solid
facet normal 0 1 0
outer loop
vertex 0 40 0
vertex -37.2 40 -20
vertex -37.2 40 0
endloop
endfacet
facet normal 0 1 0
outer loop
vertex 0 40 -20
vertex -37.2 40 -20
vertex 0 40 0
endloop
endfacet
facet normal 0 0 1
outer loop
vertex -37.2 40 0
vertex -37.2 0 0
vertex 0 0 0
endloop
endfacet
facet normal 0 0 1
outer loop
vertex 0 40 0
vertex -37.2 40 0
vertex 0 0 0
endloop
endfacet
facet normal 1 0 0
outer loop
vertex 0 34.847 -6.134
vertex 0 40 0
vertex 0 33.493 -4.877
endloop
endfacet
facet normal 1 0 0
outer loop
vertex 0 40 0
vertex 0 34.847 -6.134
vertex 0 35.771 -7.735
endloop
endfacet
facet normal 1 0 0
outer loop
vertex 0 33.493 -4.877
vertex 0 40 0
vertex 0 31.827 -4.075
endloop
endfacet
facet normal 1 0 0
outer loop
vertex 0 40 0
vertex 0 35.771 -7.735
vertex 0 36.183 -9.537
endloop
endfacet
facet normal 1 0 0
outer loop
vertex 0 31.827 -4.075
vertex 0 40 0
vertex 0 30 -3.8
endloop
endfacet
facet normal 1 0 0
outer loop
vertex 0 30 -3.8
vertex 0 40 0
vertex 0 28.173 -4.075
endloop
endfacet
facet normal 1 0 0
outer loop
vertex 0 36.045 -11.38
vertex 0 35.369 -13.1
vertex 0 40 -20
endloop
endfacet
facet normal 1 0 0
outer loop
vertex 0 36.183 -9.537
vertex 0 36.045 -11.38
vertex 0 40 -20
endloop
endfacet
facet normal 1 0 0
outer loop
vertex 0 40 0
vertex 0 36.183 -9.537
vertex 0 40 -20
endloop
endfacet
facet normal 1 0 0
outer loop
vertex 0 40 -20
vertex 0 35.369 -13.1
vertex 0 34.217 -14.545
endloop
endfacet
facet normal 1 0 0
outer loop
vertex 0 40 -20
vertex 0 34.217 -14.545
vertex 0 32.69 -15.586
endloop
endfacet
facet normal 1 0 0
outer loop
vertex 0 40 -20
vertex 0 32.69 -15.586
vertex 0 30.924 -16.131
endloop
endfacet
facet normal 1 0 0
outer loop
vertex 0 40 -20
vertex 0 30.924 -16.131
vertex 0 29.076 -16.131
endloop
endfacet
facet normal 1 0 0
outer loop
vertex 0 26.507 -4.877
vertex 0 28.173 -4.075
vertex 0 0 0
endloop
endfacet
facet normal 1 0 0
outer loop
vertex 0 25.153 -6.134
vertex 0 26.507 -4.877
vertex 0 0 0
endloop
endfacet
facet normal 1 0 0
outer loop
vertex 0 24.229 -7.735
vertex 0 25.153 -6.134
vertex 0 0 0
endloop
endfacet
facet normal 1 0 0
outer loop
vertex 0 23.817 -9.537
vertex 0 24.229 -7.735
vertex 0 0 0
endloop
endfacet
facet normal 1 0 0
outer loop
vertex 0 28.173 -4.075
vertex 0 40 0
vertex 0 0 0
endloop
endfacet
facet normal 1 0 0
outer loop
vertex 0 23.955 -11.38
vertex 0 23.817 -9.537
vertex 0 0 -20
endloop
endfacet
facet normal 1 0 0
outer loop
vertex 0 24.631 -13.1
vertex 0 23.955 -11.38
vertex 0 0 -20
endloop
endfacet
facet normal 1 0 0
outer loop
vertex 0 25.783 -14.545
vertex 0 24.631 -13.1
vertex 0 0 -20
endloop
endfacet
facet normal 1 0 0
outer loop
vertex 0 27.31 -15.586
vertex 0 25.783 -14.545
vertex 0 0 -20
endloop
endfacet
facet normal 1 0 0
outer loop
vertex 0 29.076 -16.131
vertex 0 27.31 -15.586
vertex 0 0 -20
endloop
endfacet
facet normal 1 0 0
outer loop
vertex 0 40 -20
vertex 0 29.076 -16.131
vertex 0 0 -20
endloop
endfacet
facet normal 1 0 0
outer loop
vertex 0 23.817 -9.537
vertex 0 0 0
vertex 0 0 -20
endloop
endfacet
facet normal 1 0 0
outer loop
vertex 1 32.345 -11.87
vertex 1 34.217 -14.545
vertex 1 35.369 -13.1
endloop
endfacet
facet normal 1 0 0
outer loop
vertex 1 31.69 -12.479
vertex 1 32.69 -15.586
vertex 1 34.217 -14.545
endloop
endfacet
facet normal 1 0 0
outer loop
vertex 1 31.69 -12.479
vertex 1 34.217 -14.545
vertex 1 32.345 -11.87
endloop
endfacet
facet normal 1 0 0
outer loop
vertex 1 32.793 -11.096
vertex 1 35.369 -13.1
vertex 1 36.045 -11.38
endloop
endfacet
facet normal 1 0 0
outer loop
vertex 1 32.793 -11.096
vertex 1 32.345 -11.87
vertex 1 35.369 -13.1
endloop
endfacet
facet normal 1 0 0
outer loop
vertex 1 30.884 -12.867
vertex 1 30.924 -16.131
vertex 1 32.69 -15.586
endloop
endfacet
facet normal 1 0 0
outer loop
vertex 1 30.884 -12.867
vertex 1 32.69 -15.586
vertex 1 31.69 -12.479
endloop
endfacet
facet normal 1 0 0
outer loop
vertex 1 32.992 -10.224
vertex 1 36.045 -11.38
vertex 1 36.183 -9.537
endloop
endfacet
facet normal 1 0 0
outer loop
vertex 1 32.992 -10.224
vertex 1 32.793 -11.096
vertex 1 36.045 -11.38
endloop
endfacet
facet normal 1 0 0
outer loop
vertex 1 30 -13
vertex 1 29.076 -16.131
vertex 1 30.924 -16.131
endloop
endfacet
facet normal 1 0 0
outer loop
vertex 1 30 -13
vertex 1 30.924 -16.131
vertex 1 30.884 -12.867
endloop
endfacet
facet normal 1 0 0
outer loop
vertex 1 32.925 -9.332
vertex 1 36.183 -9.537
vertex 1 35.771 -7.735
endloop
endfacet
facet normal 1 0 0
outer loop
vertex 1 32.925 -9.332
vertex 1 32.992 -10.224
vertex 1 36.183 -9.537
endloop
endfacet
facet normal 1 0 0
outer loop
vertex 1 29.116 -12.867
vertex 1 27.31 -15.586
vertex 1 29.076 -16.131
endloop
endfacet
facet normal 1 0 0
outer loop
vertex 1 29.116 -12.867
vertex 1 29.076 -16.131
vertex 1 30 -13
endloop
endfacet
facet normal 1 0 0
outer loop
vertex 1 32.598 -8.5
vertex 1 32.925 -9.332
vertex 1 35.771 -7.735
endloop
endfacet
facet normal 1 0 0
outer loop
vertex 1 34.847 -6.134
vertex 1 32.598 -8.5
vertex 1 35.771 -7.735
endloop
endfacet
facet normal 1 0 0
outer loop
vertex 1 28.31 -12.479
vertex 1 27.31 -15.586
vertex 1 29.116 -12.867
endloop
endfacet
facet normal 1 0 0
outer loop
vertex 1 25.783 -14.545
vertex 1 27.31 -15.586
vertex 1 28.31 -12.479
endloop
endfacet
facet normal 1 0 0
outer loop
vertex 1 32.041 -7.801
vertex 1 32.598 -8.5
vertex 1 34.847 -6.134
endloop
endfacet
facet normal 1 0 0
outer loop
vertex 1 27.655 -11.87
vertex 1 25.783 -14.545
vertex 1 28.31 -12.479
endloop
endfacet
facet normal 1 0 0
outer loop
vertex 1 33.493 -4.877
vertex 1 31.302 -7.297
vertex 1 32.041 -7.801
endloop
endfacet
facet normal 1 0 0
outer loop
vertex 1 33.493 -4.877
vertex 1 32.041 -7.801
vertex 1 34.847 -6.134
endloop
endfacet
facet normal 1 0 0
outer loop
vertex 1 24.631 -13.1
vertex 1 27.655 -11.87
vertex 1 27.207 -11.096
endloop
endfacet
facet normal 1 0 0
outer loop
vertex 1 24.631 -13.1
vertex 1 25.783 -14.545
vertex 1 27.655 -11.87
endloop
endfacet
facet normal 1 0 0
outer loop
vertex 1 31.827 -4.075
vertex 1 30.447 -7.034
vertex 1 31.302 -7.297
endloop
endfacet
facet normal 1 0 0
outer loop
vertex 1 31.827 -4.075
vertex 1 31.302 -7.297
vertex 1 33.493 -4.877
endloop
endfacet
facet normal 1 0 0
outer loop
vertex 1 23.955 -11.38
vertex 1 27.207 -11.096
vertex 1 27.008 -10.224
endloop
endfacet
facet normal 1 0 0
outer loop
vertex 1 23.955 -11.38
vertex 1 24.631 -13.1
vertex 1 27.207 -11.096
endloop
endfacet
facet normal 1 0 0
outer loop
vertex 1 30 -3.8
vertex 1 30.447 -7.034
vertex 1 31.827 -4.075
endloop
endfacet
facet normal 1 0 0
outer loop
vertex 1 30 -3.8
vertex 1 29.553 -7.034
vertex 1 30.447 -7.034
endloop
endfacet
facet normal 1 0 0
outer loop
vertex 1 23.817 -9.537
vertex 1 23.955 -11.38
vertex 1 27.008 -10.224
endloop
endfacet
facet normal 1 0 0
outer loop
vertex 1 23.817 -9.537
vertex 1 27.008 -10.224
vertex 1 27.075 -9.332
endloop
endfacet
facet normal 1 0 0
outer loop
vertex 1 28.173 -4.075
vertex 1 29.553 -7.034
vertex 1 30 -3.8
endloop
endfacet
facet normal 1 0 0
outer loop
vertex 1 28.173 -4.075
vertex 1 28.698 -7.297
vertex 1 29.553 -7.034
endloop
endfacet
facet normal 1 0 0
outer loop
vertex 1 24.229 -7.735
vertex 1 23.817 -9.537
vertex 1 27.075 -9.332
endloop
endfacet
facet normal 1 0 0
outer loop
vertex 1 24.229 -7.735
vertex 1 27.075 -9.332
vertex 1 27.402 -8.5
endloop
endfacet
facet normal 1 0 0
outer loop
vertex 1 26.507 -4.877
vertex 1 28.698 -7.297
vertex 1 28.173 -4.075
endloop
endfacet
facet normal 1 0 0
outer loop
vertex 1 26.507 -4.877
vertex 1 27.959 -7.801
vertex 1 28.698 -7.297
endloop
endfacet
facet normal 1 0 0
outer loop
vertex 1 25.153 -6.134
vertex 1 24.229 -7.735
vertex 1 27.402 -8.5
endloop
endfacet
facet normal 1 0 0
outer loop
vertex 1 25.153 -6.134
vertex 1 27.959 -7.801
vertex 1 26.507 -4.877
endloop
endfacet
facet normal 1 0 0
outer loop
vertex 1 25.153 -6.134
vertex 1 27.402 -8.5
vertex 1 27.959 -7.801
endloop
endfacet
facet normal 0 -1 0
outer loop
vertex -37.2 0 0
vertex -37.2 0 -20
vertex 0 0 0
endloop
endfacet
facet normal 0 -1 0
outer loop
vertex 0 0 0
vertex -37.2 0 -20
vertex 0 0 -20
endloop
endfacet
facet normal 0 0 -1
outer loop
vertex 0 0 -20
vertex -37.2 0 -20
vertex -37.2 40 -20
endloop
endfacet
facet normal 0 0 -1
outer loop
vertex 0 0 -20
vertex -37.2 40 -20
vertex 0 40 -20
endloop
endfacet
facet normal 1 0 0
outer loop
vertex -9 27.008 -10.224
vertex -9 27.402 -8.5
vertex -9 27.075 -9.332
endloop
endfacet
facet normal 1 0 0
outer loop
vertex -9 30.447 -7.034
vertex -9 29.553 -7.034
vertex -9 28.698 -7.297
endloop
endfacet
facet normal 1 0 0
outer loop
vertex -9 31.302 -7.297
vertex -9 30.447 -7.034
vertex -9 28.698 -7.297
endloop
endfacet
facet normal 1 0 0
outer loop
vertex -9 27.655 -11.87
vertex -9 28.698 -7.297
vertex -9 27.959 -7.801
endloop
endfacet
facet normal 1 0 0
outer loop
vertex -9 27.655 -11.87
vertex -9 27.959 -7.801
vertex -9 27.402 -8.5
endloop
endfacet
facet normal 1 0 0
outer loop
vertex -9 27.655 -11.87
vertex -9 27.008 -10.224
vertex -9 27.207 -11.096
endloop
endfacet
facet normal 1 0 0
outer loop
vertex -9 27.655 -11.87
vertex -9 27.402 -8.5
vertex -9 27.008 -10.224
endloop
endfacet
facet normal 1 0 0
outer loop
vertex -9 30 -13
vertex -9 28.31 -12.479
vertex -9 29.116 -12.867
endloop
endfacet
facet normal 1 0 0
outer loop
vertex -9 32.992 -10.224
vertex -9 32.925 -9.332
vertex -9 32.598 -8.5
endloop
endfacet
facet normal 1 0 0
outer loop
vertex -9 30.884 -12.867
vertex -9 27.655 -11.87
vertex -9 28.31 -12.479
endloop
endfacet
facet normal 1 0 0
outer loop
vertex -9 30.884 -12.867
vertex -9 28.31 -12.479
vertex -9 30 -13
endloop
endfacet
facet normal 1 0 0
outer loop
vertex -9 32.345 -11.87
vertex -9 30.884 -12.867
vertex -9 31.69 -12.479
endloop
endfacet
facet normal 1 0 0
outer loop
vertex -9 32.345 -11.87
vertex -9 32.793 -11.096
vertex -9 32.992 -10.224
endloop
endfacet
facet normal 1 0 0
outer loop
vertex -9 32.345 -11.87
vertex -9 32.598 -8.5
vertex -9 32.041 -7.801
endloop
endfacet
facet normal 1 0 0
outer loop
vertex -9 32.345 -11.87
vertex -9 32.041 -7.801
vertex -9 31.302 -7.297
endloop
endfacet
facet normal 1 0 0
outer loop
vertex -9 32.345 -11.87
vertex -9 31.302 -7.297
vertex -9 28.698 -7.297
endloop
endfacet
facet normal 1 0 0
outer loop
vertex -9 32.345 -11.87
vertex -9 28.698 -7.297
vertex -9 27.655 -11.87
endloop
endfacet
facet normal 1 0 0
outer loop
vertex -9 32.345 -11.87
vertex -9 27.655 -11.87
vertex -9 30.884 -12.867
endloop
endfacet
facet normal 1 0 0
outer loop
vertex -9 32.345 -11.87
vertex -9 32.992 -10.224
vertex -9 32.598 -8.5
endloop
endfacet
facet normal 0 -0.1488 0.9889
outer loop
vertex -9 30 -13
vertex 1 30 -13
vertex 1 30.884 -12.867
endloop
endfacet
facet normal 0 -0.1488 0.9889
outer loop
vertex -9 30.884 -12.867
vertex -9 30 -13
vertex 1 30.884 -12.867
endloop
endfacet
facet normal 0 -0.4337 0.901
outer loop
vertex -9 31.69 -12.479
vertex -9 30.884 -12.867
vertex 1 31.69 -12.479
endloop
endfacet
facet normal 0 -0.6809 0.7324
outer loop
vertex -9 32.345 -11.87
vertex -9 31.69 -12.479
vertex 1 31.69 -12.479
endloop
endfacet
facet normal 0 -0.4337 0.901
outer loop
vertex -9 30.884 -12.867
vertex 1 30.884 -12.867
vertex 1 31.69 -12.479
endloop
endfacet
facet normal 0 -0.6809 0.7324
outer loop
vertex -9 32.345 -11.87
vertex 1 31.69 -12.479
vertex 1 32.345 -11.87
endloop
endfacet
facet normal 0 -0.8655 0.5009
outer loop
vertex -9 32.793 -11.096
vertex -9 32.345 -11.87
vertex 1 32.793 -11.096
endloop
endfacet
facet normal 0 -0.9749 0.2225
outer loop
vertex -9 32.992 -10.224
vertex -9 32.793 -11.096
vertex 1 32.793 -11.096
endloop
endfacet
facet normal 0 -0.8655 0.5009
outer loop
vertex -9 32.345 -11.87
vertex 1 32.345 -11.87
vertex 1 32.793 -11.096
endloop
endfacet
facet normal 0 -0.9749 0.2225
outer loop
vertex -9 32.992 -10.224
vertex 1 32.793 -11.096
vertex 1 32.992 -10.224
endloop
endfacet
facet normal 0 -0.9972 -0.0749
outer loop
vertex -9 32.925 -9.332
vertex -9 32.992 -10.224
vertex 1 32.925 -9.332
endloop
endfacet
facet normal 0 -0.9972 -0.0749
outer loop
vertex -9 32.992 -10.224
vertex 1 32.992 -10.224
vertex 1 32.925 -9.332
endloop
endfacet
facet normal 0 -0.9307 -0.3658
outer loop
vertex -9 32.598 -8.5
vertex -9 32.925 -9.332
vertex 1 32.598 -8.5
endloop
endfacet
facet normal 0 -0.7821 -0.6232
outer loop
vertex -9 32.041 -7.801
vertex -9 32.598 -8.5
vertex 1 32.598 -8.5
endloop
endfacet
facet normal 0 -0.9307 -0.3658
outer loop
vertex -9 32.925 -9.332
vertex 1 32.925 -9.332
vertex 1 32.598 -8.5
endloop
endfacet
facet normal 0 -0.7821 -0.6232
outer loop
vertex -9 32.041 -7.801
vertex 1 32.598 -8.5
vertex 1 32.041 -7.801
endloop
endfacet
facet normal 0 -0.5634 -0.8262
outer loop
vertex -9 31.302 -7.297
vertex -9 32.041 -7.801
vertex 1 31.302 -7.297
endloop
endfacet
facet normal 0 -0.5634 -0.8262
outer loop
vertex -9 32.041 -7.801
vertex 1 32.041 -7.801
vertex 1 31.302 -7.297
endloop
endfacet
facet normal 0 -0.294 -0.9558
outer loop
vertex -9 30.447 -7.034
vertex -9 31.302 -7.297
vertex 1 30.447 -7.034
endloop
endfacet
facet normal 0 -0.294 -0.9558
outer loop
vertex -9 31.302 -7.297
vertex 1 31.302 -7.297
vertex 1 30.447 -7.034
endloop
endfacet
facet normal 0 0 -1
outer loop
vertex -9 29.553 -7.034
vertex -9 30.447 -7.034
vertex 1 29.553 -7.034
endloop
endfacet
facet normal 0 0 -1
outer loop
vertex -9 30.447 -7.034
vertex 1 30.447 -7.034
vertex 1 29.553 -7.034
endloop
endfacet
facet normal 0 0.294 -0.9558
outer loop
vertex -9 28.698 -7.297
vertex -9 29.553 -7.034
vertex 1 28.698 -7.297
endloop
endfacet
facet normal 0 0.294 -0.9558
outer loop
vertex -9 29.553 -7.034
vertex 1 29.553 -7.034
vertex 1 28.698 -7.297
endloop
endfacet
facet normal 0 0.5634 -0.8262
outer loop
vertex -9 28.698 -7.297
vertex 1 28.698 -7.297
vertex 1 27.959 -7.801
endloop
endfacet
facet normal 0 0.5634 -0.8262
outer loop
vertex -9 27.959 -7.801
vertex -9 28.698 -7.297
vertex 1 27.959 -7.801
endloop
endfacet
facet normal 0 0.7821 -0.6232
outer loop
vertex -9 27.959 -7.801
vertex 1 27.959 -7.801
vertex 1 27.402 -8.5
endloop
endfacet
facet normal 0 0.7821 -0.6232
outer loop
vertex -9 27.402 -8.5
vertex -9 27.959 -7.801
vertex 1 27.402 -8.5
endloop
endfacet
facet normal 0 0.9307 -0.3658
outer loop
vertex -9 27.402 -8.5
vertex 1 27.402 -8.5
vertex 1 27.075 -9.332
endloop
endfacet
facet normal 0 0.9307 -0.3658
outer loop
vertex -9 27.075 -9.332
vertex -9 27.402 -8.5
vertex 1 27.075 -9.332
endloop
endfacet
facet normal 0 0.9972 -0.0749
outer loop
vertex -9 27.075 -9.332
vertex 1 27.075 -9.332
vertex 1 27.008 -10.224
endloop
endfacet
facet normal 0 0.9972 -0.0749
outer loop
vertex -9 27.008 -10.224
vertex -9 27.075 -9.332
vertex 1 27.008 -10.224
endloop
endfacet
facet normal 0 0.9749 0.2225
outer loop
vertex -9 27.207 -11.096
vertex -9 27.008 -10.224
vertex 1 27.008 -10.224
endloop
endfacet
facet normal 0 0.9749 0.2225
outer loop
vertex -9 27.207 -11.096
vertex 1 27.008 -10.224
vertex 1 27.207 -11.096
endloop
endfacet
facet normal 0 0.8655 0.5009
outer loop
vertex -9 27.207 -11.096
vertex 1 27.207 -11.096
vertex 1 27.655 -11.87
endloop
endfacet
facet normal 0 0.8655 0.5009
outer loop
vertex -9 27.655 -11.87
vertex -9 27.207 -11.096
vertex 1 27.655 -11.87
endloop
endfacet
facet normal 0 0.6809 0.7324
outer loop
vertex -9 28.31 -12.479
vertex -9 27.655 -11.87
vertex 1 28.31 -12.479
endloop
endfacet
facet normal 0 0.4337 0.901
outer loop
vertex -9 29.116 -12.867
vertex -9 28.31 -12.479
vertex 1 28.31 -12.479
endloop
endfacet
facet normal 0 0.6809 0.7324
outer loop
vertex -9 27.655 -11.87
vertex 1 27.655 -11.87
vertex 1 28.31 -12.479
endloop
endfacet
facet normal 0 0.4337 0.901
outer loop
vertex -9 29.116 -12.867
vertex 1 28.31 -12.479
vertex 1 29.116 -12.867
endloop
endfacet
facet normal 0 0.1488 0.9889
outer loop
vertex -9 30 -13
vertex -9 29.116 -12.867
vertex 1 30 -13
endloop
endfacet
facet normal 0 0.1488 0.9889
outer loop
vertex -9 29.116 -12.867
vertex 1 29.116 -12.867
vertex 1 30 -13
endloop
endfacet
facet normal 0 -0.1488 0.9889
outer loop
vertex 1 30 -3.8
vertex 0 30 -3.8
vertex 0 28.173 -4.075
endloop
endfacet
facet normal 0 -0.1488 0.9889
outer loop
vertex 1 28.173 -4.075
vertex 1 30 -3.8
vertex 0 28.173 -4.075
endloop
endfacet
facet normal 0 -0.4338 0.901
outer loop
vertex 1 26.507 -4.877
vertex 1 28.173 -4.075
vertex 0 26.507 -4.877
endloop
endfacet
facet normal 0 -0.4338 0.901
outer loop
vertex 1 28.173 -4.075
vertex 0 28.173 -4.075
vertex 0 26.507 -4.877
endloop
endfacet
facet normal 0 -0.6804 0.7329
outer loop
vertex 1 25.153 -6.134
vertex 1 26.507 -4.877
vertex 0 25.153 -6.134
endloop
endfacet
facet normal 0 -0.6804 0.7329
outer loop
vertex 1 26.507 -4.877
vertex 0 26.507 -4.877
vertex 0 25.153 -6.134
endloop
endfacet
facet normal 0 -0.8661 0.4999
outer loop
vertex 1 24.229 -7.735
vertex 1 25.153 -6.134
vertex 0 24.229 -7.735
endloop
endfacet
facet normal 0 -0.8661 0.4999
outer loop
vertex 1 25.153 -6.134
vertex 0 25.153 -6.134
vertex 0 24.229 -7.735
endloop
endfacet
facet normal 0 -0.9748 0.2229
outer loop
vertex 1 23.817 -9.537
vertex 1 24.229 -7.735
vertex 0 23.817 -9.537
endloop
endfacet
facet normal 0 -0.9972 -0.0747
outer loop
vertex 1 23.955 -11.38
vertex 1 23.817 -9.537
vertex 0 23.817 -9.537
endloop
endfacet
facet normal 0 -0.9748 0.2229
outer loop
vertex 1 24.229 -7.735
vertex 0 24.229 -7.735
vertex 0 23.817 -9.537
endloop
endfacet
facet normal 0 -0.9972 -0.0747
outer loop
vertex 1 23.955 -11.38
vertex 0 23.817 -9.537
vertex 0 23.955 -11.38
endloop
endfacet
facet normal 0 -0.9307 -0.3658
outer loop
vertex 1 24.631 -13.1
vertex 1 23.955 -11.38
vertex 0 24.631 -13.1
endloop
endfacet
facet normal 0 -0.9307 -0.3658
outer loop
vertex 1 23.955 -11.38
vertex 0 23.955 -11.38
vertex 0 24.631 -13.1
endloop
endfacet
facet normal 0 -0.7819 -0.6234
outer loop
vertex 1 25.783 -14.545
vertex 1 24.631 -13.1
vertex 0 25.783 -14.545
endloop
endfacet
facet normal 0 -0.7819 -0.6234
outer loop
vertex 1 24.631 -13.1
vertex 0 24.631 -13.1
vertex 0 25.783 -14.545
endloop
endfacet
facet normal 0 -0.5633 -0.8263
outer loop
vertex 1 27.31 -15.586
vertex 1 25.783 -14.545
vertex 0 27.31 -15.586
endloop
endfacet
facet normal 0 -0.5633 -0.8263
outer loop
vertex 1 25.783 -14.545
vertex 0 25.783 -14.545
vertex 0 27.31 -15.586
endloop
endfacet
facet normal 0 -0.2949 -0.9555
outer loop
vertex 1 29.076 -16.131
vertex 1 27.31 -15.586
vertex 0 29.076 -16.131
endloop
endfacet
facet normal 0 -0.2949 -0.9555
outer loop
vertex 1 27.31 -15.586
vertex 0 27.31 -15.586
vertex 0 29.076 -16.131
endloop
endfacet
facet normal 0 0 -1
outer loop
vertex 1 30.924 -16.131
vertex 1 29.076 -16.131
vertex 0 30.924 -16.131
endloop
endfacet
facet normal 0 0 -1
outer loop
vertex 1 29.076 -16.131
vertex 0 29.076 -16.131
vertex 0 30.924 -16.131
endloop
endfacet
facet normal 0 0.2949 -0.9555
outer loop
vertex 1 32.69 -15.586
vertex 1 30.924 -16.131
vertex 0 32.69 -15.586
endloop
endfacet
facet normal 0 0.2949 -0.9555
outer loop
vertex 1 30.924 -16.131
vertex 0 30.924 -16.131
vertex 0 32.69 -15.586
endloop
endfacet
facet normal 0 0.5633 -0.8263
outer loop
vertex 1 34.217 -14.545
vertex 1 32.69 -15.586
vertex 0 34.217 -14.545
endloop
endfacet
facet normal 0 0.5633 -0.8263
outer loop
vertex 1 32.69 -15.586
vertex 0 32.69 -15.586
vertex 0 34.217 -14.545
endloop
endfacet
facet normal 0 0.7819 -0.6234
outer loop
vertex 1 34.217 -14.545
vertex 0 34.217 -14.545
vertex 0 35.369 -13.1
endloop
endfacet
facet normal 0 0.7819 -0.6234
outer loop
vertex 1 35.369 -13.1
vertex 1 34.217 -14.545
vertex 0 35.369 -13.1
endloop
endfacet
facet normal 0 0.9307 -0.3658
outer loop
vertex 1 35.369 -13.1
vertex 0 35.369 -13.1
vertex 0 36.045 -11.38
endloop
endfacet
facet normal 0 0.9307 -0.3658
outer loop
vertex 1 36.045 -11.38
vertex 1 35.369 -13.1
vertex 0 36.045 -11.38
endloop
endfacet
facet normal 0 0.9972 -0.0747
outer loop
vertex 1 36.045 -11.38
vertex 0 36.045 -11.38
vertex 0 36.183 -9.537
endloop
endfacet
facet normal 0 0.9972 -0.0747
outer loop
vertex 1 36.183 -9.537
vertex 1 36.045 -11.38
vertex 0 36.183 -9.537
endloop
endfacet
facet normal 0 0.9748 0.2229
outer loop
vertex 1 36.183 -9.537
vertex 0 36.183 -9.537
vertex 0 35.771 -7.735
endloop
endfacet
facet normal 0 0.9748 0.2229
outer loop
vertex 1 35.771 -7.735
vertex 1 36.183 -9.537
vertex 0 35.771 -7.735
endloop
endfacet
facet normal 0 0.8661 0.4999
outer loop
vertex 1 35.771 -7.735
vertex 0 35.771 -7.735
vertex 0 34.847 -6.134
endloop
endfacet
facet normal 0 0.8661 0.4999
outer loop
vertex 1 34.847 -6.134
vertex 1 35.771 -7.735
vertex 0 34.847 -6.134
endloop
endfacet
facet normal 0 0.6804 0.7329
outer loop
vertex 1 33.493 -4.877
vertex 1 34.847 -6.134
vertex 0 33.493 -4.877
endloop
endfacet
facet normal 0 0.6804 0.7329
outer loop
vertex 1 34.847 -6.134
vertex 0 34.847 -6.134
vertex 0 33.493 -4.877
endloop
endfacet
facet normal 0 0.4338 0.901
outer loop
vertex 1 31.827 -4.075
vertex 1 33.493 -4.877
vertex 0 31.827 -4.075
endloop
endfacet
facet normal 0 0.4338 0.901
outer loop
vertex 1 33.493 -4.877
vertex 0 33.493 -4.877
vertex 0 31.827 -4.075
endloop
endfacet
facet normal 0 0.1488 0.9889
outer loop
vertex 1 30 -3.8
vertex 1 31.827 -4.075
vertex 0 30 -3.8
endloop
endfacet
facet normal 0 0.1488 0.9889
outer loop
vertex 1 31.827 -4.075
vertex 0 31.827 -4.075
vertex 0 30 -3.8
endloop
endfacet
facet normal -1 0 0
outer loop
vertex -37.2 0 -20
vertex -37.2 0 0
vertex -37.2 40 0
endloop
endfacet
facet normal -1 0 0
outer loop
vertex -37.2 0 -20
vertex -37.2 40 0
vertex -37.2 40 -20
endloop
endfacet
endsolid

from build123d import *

# Parameters (mm, degrees)
SKETCH1_W           = 37.2
SKETCH1_H           = 20
BOSS_EXTRUDE1_DEPTH = 40
SKETCH2_R           = 6.2
BOSS_EXTRUDE2_DEPTH = 1
SKETCH3_R           = 3
CUT_EXTRUDE1_DEPTH  = 10


with BuildPart() as part:
    # Sketch1 → Boss-Extrude1 (new body)
    with BuildSketch(Plane(origin=(0, 0, 0), x_dir=(1, 0, 0), z_dir=(0, 1, 0))):
        with Locations((-18.6, 10)):
            Rectangle(SKETCH1_W, SKETCH1_H)
    extrude(amount=BOSS_EXTRUDE1_DEPTH)

    # Sketch2 → Boss-Extrude2 (add)
    with BuildSketch(Plane(origin=(0, 0, 0), x_dir=(0, 0, -1), z_dir=(1, 0, 0))):
        with Locations(Location((10, 30, 0), (0, 0, 180))):
            Circle(SKETCH2_R)
    extrude(amount=BOSS_EXTRUDE2_DEPTH)

    # Sketch3 → Cut-Extrude1 (cut)
    with BuildSketch(Plane(origin=(1, 0, 0), x_dir=(0, 0, -1), z_dir=(1, 0, 0))):
        with Locations((10, 30)):
            Circle(SKETCH3_R)
    extrude(amount=-CUT_EXTRUDE1_DEPTH, mode=Mode.SUBTRACT)


solid = part.part
